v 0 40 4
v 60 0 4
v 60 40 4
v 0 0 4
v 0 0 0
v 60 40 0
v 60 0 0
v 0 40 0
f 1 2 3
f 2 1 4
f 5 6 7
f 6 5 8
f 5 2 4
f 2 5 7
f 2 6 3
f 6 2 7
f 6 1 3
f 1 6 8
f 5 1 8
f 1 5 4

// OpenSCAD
module pt_platform() {
  w=60.0; h=40.0; t=4.0;
  cube([w,h,t], center=false);
}
pt_platform();
